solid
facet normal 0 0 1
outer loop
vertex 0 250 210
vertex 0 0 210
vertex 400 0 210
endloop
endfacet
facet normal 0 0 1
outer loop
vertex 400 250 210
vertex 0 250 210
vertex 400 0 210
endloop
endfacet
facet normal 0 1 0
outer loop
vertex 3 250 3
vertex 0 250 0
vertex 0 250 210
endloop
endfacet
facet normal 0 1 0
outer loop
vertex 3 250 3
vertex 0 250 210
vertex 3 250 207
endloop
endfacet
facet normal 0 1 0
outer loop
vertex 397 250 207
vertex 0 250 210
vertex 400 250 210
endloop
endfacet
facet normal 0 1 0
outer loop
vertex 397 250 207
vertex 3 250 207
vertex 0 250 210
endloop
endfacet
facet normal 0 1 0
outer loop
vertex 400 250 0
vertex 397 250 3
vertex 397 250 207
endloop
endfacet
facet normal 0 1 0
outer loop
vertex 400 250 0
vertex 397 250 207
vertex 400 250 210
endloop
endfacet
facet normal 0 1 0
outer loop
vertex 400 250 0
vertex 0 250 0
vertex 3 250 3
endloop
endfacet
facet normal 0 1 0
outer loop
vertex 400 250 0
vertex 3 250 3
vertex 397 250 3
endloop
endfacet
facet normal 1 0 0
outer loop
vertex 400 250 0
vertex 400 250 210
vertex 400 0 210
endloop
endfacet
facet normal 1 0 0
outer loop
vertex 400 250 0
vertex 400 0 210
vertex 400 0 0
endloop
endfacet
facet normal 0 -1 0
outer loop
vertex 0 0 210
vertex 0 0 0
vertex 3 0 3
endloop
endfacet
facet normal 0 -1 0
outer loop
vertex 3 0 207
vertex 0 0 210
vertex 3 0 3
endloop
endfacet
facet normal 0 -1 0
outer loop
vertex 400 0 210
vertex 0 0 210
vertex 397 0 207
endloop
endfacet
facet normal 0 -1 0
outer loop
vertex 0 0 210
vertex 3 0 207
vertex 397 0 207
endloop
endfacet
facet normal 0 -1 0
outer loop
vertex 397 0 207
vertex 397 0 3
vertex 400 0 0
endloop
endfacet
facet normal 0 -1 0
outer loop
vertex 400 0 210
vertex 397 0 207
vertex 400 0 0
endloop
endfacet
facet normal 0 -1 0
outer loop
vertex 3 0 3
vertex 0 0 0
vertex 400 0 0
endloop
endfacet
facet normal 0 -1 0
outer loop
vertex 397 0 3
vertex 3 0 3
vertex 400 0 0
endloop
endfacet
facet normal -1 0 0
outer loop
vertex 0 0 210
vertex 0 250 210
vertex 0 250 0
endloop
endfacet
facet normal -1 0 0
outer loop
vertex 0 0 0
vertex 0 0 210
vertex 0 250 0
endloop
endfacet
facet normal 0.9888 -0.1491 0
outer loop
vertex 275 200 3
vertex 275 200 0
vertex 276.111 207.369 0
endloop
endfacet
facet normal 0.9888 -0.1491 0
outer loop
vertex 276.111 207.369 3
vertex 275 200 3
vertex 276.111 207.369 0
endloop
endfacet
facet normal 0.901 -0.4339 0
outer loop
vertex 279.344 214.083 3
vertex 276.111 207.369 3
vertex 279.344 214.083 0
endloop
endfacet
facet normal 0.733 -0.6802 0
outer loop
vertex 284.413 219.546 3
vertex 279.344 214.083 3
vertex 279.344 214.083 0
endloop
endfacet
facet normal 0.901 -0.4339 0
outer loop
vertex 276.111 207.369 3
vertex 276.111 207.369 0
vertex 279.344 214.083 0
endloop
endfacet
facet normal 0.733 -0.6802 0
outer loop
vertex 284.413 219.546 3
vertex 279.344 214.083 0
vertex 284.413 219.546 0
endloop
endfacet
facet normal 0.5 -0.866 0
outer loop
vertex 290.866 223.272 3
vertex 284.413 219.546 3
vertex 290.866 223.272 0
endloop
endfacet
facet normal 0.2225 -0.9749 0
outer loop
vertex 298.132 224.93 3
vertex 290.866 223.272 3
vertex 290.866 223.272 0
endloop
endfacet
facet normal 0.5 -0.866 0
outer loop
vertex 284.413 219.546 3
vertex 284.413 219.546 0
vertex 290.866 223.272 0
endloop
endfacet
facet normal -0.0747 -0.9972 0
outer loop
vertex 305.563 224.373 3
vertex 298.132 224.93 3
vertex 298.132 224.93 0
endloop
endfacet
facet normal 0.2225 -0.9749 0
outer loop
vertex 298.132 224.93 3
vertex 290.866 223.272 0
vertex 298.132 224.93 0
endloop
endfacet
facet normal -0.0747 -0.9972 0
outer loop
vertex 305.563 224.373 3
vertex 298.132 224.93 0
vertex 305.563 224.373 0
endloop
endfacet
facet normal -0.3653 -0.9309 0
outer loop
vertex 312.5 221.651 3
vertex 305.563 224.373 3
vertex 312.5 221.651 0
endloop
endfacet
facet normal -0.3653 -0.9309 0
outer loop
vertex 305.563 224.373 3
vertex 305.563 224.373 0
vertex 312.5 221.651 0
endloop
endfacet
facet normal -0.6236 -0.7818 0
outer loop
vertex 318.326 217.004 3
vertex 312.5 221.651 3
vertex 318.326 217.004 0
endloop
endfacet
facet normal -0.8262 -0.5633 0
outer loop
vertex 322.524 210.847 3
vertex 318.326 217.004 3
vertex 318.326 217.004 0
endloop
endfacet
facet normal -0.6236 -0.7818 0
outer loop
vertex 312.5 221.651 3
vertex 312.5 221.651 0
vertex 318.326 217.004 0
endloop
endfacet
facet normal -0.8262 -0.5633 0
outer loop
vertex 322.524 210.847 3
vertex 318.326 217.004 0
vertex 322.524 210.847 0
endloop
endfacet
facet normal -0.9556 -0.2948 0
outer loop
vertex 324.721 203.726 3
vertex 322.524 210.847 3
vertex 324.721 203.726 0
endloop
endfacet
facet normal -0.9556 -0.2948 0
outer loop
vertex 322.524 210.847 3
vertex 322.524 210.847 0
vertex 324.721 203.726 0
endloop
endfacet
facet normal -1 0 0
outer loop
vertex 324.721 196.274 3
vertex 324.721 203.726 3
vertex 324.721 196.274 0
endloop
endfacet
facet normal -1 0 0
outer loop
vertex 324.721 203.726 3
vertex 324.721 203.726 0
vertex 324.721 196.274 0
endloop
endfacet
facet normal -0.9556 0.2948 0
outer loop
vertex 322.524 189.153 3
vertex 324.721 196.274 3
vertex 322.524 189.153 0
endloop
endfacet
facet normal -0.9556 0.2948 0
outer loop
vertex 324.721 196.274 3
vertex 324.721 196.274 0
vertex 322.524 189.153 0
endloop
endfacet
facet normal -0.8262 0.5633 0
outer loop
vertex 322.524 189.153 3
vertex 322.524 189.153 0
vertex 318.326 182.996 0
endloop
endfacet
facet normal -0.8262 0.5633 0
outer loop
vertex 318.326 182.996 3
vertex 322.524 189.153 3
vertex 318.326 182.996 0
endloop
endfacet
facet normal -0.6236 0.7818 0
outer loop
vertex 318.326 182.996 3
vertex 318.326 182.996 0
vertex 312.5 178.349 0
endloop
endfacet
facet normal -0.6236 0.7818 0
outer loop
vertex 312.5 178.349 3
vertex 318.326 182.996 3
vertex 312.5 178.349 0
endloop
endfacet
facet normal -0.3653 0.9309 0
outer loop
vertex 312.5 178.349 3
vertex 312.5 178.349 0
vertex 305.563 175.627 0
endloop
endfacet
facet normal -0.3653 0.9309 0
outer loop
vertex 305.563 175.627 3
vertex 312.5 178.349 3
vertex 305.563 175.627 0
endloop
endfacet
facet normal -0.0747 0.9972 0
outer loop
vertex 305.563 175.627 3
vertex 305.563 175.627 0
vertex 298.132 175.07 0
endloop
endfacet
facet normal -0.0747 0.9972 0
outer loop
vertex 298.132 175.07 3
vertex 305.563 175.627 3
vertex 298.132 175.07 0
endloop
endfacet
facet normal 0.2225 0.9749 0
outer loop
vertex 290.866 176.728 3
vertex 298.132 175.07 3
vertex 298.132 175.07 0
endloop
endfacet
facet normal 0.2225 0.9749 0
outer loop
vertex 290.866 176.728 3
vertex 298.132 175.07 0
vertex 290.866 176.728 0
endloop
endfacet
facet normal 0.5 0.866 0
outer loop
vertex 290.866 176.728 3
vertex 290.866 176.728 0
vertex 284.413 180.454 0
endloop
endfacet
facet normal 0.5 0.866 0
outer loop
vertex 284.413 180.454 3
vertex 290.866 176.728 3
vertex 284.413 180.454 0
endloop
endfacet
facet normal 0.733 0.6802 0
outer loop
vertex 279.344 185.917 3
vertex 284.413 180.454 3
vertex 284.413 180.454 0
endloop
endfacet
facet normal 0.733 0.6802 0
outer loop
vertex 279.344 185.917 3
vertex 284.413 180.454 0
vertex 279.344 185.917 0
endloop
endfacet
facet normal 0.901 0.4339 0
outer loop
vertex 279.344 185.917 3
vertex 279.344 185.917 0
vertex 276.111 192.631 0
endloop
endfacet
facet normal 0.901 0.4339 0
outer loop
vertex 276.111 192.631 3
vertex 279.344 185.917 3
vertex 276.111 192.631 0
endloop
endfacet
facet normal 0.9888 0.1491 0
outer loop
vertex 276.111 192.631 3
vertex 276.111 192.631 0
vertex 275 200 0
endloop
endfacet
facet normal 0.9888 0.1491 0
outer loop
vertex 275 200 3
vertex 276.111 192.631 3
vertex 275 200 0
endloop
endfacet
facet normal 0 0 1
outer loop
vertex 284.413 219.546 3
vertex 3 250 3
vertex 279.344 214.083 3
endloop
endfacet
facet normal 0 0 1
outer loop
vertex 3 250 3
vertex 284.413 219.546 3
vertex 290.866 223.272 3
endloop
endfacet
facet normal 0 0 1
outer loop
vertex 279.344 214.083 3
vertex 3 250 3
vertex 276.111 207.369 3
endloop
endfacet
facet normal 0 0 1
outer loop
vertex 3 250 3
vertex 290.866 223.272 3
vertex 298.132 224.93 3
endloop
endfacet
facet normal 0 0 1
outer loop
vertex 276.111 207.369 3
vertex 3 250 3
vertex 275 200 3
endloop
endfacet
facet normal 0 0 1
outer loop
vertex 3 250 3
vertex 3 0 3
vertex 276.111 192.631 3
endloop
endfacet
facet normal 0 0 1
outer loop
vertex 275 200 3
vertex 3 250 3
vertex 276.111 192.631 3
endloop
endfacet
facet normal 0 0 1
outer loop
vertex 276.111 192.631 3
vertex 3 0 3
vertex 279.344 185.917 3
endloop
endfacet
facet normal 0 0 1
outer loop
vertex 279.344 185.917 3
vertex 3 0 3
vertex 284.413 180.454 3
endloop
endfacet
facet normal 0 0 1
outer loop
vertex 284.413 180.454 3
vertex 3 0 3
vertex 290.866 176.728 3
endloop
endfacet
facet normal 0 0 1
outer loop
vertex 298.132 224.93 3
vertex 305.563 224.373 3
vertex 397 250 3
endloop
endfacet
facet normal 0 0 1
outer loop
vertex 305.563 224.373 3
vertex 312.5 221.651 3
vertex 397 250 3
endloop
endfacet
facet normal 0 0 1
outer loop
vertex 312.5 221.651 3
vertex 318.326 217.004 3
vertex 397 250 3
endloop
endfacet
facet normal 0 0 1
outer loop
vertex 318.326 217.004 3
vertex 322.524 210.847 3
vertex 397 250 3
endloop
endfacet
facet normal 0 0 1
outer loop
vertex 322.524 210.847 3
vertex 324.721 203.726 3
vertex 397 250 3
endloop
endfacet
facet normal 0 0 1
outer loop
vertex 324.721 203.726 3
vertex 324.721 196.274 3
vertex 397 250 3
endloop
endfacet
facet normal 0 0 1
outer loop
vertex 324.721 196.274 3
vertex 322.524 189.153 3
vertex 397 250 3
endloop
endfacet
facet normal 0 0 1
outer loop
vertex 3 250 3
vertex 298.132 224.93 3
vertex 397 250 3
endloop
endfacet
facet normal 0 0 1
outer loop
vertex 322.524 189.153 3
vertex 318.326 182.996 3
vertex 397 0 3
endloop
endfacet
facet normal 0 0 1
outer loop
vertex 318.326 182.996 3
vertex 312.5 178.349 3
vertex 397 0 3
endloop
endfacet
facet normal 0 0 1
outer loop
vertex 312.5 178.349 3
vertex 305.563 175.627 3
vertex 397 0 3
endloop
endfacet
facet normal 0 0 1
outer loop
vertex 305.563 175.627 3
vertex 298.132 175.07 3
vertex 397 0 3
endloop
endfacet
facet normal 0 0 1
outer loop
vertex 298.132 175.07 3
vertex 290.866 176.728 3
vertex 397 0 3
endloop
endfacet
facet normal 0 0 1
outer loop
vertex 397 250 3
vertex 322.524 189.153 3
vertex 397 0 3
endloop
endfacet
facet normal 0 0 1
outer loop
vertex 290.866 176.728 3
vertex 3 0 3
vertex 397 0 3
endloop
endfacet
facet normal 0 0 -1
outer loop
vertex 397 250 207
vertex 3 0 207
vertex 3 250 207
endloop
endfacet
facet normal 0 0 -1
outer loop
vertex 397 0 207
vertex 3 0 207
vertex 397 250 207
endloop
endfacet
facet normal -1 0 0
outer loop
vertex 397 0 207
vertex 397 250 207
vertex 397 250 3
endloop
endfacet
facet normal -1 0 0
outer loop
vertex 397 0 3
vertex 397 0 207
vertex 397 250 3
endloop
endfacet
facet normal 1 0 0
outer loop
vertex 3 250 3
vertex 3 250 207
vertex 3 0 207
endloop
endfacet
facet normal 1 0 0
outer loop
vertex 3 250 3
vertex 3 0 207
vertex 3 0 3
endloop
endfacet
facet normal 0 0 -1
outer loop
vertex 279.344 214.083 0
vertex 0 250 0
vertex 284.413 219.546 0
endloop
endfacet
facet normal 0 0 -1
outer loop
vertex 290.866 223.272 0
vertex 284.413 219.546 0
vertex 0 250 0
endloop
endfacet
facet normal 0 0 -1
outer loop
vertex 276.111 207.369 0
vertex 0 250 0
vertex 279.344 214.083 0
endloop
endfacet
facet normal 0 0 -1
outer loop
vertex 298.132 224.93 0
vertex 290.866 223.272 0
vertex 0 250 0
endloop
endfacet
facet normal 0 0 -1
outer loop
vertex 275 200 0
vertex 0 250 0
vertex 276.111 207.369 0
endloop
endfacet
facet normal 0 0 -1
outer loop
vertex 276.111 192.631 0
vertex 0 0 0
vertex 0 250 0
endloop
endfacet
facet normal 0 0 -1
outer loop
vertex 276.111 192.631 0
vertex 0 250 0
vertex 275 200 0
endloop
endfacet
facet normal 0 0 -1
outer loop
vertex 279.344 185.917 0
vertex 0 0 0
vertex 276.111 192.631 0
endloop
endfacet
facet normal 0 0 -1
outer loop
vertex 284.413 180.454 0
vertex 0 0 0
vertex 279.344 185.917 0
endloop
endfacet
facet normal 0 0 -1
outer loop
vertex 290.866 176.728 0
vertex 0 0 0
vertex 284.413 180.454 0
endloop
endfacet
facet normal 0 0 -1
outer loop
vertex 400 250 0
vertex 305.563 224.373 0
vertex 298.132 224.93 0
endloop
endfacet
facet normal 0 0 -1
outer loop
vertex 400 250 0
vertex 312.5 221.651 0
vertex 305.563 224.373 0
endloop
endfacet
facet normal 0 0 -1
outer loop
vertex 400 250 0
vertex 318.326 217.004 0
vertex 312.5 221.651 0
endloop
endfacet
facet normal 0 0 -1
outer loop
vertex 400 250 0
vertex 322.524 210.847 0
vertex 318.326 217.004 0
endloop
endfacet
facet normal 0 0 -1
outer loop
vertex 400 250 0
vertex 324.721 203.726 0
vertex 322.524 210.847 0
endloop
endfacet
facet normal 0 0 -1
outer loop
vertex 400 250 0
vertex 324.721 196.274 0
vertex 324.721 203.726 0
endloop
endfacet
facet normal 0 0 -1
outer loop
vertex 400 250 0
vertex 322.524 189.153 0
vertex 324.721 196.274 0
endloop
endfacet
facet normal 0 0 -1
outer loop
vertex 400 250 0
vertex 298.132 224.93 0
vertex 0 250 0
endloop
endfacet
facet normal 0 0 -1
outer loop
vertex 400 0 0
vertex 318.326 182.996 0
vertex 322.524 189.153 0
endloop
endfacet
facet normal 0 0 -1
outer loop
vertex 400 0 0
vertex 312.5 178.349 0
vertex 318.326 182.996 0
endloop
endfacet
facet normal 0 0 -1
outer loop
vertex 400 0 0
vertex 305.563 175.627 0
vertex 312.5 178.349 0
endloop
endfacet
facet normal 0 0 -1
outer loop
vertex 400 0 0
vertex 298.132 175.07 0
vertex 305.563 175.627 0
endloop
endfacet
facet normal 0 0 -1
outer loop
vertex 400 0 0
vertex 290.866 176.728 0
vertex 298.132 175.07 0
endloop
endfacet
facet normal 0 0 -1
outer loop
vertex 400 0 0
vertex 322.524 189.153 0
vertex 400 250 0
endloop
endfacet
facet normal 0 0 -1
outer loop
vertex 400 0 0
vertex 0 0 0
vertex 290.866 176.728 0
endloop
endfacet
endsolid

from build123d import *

# Parameters (mm, degrees)
SKETCH1_W           = 400
SKETCH1_H           = 210
SKETCH1_W_2         = 394
SKETCH1_H_2         = 204
EXTRUDE_THIN1_DEPTH = 250
SKETCH4_R           = 25
CUT_EXTRUDE1_DEPTH  = 10


with BuildPart() as part:
    # Sketch1 → Extrude-Thin1 (new body)
    with BuildSketch(Plane(origin=(0, 0, 0), x_dir=(1, 0, 0), z_dir=(0, 1, 0))):
        with Locations((200, -105)):
            Rectangle(SKETCH1_W, SKETCH1_H)
        with Locations((200, -105)):
            Rectangle(SKETCH1_W_2, SKETCH1_H_2, mode=Mode.SUBTRACT)
    extrude(amount=EXTRUDE_THIN1_DEPTH)

    # Sketch4 → Cut-Extrude1 (cut)
    with BuildSketch(Plane(origin=(0, 0, 0), x_dir=(-1, 0, 0), z_dir=(0, 0, -1))):
        with Locations((-300, 200)):
            Circle(SKETCH4_R)
    extrude(amount=-CUT_EXTRUDE1_DEPTH, mode=Mode.SUBTRACT)


solid = part.part
